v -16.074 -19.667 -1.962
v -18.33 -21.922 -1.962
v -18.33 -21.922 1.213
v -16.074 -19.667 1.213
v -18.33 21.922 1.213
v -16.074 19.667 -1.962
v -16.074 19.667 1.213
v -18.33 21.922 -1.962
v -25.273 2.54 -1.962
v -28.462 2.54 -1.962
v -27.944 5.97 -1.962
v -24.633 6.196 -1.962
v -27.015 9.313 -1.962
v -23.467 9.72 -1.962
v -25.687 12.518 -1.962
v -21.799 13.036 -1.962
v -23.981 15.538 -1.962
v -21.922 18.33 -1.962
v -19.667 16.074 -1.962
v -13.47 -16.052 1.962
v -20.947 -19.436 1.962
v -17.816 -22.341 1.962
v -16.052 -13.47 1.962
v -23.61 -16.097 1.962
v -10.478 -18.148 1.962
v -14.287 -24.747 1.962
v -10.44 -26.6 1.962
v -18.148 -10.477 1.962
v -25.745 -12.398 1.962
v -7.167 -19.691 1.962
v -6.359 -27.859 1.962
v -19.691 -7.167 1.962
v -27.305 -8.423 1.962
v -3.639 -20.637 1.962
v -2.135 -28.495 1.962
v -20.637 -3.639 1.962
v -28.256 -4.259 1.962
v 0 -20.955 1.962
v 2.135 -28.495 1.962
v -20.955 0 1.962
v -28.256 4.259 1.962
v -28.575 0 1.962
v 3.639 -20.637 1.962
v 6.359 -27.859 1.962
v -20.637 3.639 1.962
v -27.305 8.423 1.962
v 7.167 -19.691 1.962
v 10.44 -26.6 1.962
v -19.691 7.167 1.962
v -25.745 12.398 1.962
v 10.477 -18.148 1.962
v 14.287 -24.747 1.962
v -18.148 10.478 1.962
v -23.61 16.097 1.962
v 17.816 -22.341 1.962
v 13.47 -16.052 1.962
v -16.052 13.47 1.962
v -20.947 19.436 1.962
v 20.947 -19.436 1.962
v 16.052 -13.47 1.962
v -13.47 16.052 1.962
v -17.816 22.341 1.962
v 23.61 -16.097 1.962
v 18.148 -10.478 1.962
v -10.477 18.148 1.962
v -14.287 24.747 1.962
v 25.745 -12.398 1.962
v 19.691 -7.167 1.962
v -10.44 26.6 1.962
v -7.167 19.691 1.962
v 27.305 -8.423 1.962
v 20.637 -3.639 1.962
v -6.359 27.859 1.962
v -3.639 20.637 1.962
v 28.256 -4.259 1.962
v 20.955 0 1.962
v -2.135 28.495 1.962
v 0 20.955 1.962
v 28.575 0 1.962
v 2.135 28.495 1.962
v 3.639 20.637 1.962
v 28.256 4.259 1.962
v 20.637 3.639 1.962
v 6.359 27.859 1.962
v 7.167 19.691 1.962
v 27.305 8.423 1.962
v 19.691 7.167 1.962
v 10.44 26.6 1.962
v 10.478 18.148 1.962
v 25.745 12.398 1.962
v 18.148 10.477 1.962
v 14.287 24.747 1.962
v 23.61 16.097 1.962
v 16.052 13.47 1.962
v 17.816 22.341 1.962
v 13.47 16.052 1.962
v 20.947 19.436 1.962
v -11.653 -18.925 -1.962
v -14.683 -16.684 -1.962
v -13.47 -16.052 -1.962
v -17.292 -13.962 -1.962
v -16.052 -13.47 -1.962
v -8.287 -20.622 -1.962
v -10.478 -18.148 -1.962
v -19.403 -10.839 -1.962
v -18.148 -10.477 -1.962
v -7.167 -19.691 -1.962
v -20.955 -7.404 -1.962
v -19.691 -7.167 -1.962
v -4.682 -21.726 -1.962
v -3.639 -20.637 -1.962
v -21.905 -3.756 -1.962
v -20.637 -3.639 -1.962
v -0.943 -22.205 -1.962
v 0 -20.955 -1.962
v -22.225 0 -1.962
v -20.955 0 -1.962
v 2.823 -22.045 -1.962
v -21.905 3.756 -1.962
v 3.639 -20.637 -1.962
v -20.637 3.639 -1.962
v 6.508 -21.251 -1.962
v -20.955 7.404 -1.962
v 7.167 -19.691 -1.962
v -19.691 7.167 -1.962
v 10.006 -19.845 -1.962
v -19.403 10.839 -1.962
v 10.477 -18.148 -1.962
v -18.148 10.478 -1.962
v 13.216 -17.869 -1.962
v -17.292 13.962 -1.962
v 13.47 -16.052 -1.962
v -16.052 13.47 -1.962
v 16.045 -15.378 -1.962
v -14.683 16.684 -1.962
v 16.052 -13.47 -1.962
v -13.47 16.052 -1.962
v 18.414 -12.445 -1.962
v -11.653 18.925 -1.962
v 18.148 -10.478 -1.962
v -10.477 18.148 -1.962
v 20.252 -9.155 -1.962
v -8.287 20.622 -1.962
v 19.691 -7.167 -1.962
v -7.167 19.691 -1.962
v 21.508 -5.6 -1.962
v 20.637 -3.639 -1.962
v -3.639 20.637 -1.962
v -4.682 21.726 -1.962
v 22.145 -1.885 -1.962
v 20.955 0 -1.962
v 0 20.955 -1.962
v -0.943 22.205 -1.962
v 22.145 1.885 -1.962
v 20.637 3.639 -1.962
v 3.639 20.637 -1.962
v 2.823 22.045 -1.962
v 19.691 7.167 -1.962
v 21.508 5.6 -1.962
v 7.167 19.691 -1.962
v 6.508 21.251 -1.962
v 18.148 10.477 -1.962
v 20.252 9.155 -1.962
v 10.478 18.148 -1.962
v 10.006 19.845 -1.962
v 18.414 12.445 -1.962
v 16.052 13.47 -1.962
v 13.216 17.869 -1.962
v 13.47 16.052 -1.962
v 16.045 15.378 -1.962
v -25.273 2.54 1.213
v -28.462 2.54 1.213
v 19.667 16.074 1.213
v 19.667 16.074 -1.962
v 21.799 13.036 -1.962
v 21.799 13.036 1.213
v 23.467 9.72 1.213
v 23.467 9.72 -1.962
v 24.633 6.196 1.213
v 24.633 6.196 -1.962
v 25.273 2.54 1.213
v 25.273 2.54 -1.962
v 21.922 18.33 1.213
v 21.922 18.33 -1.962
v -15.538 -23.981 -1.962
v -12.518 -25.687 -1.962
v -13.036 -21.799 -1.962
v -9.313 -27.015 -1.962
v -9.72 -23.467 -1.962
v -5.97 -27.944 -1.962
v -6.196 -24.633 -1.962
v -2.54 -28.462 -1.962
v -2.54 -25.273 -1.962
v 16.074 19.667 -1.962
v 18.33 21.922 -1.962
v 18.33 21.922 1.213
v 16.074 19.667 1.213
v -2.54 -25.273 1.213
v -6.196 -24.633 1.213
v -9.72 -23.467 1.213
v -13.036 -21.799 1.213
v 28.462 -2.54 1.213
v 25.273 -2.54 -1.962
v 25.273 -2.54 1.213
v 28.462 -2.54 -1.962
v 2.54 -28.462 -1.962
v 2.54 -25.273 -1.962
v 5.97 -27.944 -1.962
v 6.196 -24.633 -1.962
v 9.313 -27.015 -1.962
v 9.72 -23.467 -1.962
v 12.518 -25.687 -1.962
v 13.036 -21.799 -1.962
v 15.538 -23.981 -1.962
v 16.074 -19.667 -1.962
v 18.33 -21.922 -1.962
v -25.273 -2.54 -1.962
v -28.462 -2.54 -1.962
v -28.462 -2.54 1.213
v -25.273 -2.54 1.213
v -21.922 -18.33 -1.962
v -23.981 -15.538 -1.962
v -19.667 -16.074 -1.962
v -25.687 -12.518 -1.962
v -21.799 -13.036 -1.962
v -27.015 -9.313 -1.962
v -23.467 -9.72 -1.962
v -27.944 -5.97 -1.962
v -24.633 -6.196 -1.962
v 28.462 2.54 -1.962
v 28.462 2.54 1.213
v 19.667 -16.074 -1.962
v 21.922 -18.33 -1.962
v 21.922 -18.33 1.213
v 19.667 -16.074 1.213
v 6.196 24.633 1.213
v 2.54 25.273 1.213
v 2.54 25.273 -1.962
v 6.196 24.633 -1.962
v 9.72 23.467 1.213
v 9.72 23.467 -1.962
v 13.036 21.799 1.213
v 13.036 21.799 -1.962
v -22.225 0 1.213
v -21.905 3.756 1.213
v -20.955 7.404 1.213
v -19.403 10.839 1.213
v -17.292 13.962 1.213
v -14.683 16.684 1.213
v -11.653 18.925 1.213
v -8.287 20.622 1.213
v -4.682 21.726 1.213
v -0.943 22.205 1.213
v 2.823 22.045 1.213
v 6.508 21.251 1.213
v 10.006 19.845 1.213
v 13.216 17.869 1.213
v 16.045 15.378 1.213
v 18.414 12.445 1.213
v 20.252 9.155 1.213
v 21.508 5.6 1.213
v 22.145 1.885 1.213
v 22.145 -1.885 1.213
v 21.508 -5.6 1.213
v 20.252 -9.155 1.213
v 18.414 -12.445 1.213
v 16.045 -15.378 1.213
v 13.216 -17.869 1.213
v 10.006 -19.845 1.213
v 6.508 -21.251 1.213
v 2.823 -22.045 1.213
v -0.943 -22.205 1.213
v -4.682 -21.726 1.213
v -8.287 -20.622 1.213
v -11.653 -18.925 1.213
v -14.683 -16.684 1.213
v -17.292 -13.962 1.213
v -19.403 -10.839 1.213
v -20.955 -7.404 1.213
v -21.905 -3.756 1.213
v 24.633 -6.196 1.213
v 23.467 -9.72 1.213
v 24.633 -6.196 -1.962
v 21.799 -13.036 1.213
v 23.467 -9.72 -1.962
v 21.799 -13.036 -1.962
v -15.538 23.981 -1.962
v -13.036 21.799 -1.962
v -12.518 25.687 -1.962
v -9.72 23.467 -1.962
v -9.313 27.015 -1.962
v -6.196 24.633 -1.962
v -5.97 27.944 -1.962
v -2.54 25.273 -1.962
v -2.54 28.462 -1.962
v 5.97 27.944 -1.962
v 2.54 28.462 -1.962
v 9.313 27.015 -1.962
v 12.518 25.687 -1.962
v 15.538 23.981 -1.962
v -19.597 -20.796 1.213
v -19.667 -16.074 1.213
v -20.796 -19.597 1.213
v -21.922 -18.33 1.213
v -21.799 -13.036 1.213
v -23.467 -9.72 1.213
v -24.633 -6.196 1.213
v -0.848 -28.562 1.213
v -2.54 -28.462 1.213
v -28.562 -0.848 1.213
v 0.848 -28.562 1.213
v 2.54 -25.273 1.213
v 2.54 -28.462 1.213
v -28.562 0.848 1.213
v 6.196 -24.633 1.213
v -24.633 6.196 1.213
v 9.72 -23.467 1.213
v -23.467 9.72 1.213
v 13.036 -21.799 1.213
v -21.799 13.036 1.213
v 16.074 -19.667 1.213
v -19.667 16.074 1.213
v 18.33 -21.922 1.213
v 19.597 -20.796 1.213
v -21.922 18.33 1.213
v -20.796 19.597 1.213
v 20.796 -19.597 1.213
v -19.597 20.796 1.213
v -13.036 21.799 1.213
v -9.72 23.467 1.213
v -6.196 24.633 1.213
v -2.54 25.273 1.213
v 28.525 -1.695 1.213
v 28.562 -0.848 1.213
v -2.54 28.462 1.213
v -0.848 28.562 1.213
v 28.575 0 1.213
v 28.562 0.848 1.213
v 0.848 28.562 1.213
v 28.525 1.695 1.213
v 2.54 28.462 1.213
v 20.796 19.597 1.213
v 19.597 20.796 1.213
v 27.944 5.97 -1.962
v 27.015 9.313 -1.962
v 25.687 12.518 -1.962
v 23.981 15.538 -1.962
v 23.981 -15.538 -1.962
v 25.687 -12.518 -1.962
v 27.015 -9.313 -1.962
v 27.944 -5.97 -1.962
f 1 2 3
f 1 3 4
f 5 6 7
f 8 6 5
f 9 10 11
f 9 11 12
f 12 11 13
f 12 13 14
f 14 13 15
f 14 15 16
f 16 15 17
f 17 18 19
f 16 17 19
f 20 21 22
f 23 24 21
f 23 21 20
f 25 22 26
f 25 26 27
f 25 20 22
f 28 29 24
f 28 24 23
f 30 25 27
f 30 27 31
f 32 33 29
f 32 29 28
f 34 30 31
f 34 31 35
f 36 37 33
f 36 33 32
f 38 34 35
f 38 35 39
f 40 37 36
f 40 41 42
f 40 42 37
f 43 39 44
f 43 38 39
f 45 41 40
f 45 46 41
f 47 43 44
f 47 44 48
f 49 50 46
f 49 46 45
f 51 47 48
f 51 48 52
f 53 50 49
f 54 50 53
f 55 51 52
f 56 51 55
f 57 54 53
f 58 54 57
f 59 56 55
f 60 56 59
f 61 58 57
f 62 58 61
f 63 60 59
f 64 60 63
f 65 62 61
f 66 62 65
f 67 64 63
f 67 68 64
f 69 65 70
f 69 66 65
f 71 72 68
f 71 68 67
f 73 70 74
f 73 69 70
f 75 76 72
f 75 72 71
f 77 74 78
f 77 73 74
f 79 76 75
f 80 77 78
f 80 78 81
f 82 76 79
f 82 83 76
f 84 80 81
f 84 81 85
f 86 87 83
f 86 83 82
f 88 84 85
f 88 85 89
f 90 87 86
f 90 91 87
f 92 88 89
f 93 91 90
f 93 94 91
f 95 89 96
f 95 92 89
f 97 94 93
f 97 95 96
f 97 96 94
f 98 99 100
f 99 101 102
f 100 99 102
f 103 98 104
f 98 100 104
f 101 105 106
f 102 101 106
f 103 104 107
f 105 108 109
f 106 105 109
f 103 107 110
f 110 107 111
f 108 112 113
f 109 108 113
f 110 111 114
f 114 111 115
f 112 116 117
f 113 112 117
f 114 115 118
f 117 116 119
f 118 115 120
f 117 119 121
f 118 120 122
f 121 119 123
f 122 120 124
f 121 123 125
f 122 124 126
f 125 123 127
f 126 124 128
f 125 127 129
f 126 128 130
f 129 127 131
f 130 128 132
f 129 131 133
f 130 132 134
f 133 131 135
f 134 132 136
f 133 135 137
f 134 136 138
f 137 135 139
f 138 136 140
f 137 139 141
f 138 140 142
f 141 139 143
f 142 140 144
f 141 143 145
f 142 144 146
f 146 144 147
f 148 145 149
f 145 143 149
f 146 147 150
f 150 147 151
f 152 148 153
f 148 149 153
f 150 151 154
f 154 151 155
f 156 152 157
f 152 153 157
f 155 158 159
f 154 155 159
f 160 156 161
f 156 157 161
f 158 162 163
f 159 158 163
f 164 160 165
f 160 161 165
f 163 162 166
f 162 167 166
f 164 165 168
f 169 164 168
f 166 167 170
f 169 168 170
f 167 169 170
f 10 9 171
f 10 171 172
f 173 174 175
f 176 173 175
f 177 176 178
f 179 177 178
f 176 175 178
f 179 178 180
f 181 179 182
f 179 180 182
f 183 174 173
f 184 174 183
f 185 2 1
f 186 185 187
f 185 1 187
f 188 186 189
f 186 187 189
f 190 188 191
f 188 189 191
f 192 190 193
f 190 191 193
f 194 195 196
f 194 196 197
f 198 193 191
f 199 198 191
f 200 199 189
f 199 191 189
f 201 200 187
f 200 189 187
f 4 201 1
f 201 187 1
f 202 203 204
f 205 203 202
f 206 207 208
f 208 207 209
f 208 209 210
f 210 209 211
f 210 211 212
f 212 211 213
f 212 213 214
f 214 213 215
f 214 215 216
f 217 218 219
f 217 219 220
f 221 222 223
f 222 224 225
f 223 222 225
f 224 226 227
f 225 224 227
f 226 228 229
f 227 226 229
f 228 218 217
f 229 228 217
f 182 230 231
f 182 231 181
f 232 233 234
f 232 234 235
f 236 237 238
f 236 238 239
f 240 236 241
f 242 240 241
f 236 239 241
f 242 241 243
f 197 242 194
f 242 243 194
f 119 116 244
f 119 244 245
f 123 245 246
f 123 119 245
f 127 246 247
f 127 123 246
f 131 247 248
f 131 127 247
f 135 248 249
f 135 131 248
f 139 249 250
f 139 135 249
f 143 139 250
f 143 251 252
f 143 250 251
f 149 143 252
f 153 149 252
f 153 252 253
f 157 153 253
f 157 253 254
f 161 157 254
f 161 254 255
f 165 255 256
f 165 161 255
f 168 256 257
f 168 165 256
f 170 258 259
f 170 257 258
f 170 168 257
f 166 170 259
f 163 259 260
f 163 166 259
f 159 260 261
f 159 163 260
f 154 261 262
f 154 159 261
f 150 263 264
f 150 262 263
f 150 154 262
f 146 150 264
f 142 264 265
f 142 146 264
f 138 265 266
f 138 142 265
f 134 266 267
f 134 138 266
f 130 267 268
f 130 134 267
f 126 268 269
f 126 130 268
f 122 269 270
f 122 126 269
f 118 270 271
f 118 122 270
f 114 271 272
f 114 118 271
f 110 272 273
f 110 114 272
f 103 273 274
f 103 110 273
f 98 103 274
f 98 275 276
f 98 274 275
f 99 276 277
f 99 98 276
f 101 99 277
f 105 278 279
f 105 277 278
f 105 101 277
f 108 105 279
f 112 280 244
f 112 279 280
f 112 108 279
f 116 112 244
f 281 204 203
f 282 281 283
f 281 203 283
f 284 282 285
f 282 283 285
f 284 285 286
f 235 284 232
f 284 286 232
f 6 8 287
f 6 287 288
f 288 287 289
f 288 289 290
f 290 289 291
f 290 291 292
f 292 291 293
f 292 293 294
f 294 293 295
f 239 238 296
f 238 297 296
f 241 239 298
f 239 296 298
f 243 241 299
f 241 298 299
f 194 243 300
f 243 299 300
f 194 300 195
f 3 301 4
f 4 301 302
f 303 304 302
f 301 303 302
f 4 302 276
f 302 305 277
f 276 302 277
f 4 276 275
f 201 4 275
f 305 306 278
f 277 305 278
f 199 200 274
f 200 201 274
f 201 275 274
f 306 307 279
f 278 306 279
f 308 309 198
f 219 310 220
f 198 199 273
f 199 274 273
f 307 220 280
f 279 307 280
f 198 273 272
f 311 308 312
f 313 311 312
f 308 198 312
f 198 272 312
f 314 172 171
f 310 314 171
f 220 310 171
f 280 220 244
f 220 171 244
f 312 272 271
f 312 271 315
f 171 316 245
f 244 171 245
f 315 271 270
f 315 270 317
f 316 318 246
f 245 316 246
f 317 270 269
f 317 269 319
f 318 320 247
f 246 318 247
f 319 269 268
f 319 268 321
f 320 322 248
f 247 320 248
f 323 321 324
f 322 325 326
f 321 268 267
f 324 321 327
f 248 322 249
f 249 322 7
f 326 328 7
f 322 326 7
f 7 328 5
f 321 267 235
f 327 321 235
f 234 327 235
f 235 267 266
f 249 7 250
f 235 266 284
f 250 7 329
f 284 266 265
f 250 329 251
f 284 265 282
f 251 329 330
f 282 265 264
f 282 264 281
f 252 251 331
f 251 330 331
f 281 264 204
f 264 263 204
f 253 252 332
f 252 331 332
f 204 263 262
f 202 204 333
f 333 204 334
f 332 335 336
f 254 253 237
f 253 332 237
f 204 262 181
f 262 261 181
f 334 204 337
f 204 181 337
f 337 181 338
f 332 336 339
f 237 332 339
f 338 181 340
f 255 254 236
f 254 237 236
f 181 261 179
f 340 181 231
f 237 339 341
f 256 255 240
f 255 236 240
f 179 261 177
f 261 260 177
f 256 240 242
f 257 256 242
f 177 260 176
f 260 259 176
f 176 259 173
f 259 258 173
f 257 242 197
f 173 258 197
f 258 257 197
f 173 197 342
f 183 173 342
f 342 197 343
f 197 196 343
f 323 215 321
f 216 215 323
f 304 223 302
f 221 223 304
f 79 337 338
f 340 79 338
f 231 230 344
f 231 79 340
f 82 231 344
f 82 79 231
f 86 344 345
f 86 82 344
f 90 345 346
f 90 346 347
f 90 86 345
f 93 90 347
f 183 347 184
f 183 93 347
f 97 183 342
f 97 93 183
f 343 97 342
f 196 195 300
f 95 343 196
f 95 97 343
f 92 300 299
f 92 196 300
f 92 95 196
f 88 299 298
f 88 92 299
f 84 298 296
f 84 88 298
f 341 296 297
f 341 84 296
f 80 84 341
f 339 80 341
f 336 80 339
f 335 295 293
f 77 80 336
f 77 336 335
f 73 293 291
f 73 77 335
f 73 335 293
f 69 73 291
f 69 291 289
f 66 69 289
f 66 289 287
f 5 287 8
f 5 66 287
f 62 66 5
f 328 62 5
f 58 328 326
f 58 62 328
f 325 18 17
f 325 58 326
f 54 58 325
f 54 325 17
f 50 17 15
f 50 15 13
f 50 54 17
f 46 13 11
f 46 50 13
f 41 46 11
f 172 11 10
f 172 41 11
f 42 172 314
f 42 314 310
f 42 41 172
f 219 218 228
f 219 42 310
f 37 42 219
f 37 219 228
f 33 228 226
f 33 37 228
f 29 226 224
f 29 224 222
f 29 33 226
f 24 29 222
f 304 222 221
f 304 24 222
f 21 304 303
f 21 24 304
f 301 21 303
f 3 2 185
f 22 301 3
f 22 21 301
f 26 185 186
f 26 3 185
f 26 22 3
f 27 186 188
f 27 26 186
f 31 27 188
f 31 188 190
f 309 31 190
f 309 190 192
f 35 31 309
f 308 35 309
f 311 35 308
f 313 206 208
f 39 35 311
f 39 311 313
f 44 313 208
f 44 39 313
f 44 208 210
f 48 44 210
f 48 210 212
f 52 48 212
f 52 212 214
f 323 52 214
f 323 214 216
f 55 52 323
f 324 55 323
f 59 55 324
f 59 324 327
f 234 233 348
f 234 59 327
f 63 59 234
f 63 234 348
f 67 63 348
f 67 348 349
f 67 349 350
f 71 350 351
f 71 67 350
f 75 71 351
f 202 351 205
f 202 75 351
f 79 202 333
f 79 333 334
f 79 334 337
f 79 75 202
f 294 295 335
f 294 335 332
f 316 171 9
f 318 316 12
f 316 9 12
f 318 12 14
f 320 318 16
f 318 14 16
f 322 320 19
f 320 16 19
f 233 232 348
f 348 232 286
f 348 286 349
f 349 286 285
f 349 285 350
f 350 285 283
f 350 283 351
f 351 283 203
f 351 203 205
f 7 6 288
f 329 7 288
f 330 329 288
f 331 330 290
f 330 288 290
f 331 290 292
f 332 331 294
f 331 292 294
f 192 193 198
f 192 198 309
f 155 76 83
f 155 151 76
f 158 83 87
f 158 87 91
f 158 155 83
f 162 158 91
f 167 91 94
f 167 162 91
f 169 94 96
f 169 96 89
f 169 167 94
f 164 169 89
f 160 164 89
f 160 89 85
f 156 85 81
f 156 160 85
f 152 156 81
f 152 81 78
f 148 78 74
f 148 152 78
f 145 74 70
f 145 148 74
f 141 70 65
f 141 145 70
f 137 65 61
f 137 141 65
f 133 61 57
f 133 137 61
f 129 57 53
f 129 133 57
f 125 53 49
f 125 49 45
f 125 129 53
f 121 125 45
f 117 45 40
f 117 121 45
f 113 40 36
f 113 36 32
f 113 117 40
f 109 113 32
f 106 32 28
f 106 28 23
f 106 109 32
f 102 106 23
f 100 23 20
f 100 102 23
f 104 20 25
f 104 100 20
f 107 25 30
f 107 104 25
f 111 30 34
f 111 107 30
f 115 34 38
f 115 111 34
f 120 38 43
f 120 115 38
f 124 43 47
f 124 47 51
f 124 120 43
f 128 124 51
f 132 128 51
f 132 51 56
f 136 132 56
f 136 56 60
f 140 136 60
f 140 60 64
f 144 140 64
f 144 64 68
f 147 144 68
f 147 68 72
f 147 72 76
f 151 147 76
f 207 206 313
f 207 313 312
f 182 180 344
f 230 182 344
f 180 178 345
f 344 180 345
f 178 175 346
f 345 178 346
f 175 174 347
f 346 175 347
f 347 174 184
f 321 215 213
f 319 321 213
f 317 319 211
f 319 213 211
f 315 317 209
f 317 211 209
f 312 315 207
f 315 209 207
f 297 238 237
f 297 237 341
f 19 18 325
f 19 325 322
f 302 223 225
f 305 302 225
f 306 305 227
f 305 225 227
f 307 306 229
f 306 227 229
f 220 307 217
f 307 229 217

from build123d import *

# Parameters (mm, degrees)
SKETCH1_R                 = 28.575
SKETCH1_R_2               = 20.955
BOSS_EXTRUDE1_DEPTH       = 1.96215
BOSS_EXTRUDE1_DEPTH_BACK  = 1.96215
F_0_80_TAPPED_HOLE1_D     = 1.19126
F_0_80_TAPPED_HOLE1_DEPTH = 3.302
F_0_80_TAPPED_HOLE1_TIP   = 0.357890611
SKETCH4_R                 = 25.4
SKETCH4_R_2               = 22.225
CUT_EXTRUDE2_DEPTH        = 3.175
CUT_EXTRUDE3_DEPTH        = 3.175
CIRPATTERN1_COUNT         = 8


with BuildPart() as part:
    # Sketch1 → Boss-Extrude1 (new body, two sides)
    with BuildSketch(Plane.XY) as boss_extrude1_sk:
        Circle(SKETCH1_R)
        Circle(SKETCH1_R_2, mode=Mode.SUBTRACT)
    extrude(amount=BOSS_EXTRUDE1_DEPTH)
    extrude(boss_extrude1_sk.sketch, amount=-BOSS_EXTRUDE1_DEPTH_BACK)

    # #0-80 Tapped Hole1
    with Locations(Plane(origin=(0, 28.575, 0.041948097), x_dir=(1, 0, 0), z_dir=(0, 1, 0))):
        with Locations((0, 0)):
            Hole(F_0_80_TAPPED_HOLE1_D / 2, depth=F_0_80_TAPPED_HOLE1_DEPTH)
            with Locations((0, 0, -(F_0_80_TAPPED_HOLE1_DEPTH + F_0_80_TAPPED_HOLE1_TIP / 2))):  # 118° drill point
                Cone(0, F_0_80_TAPPED_HOLE1_D / 2, F_0_80_TAPPED_HOLE1_TIP, mode=Mode.SUBTRACT)

    # Sketch4 → Cut-Extrude2 (cut)
    with BuildSketch(Plane(origin=(0, 0, -1.96215), x_dir=(-1, 0, 0), z_dir=(0, 0, -1))):
        Circle(SKETCH4_R)
        Circle(SKETCH4_R_2, mode=Mode.SUBTRACT)
    extrude(amount=-CUT_EXTRUDE2_DEPTH, mode=Mode.SUBTRACT)

    # Sketch5 → Cut-Extrude3 (cut)
    with BuildSketch(Plane(origin=(0, 0, -1.96215), x_dir=(-1, 0, 0), z_dir=(0, 0, -1))):
        with BuildLine():
            Line((2.54, 31.115), (2.54, 24.765))
            ThreePointArc((2.54, 24.765), (0, 22.225), (-2.54, 24.765))
            Line((-2.54, 24.765), (-2.54, 31.115))
            ThreePointArc((-2.54, 31.115), (0, 33.655), (2.54, 31.115))
        make_face()
    cut_extrude3 = extrude(amount=-CUT_EXTRUDE3_DEPTH, mode=Mode.SUBTRACT)

    # CirPattern1: Cut-Extrude3 ×8 about axis
    cirpattern1_axis = Axis((0, 0, 0), (0, 0, 1))
    for i in range(1, CIRPATTERN1_COUNT):
        add(cut_extrude3.rotate(cirpattern1_axis, i * 360 / CIRPATTERN1_COUNT), mode=Mode.SUBTRACT)


solid = part.part
